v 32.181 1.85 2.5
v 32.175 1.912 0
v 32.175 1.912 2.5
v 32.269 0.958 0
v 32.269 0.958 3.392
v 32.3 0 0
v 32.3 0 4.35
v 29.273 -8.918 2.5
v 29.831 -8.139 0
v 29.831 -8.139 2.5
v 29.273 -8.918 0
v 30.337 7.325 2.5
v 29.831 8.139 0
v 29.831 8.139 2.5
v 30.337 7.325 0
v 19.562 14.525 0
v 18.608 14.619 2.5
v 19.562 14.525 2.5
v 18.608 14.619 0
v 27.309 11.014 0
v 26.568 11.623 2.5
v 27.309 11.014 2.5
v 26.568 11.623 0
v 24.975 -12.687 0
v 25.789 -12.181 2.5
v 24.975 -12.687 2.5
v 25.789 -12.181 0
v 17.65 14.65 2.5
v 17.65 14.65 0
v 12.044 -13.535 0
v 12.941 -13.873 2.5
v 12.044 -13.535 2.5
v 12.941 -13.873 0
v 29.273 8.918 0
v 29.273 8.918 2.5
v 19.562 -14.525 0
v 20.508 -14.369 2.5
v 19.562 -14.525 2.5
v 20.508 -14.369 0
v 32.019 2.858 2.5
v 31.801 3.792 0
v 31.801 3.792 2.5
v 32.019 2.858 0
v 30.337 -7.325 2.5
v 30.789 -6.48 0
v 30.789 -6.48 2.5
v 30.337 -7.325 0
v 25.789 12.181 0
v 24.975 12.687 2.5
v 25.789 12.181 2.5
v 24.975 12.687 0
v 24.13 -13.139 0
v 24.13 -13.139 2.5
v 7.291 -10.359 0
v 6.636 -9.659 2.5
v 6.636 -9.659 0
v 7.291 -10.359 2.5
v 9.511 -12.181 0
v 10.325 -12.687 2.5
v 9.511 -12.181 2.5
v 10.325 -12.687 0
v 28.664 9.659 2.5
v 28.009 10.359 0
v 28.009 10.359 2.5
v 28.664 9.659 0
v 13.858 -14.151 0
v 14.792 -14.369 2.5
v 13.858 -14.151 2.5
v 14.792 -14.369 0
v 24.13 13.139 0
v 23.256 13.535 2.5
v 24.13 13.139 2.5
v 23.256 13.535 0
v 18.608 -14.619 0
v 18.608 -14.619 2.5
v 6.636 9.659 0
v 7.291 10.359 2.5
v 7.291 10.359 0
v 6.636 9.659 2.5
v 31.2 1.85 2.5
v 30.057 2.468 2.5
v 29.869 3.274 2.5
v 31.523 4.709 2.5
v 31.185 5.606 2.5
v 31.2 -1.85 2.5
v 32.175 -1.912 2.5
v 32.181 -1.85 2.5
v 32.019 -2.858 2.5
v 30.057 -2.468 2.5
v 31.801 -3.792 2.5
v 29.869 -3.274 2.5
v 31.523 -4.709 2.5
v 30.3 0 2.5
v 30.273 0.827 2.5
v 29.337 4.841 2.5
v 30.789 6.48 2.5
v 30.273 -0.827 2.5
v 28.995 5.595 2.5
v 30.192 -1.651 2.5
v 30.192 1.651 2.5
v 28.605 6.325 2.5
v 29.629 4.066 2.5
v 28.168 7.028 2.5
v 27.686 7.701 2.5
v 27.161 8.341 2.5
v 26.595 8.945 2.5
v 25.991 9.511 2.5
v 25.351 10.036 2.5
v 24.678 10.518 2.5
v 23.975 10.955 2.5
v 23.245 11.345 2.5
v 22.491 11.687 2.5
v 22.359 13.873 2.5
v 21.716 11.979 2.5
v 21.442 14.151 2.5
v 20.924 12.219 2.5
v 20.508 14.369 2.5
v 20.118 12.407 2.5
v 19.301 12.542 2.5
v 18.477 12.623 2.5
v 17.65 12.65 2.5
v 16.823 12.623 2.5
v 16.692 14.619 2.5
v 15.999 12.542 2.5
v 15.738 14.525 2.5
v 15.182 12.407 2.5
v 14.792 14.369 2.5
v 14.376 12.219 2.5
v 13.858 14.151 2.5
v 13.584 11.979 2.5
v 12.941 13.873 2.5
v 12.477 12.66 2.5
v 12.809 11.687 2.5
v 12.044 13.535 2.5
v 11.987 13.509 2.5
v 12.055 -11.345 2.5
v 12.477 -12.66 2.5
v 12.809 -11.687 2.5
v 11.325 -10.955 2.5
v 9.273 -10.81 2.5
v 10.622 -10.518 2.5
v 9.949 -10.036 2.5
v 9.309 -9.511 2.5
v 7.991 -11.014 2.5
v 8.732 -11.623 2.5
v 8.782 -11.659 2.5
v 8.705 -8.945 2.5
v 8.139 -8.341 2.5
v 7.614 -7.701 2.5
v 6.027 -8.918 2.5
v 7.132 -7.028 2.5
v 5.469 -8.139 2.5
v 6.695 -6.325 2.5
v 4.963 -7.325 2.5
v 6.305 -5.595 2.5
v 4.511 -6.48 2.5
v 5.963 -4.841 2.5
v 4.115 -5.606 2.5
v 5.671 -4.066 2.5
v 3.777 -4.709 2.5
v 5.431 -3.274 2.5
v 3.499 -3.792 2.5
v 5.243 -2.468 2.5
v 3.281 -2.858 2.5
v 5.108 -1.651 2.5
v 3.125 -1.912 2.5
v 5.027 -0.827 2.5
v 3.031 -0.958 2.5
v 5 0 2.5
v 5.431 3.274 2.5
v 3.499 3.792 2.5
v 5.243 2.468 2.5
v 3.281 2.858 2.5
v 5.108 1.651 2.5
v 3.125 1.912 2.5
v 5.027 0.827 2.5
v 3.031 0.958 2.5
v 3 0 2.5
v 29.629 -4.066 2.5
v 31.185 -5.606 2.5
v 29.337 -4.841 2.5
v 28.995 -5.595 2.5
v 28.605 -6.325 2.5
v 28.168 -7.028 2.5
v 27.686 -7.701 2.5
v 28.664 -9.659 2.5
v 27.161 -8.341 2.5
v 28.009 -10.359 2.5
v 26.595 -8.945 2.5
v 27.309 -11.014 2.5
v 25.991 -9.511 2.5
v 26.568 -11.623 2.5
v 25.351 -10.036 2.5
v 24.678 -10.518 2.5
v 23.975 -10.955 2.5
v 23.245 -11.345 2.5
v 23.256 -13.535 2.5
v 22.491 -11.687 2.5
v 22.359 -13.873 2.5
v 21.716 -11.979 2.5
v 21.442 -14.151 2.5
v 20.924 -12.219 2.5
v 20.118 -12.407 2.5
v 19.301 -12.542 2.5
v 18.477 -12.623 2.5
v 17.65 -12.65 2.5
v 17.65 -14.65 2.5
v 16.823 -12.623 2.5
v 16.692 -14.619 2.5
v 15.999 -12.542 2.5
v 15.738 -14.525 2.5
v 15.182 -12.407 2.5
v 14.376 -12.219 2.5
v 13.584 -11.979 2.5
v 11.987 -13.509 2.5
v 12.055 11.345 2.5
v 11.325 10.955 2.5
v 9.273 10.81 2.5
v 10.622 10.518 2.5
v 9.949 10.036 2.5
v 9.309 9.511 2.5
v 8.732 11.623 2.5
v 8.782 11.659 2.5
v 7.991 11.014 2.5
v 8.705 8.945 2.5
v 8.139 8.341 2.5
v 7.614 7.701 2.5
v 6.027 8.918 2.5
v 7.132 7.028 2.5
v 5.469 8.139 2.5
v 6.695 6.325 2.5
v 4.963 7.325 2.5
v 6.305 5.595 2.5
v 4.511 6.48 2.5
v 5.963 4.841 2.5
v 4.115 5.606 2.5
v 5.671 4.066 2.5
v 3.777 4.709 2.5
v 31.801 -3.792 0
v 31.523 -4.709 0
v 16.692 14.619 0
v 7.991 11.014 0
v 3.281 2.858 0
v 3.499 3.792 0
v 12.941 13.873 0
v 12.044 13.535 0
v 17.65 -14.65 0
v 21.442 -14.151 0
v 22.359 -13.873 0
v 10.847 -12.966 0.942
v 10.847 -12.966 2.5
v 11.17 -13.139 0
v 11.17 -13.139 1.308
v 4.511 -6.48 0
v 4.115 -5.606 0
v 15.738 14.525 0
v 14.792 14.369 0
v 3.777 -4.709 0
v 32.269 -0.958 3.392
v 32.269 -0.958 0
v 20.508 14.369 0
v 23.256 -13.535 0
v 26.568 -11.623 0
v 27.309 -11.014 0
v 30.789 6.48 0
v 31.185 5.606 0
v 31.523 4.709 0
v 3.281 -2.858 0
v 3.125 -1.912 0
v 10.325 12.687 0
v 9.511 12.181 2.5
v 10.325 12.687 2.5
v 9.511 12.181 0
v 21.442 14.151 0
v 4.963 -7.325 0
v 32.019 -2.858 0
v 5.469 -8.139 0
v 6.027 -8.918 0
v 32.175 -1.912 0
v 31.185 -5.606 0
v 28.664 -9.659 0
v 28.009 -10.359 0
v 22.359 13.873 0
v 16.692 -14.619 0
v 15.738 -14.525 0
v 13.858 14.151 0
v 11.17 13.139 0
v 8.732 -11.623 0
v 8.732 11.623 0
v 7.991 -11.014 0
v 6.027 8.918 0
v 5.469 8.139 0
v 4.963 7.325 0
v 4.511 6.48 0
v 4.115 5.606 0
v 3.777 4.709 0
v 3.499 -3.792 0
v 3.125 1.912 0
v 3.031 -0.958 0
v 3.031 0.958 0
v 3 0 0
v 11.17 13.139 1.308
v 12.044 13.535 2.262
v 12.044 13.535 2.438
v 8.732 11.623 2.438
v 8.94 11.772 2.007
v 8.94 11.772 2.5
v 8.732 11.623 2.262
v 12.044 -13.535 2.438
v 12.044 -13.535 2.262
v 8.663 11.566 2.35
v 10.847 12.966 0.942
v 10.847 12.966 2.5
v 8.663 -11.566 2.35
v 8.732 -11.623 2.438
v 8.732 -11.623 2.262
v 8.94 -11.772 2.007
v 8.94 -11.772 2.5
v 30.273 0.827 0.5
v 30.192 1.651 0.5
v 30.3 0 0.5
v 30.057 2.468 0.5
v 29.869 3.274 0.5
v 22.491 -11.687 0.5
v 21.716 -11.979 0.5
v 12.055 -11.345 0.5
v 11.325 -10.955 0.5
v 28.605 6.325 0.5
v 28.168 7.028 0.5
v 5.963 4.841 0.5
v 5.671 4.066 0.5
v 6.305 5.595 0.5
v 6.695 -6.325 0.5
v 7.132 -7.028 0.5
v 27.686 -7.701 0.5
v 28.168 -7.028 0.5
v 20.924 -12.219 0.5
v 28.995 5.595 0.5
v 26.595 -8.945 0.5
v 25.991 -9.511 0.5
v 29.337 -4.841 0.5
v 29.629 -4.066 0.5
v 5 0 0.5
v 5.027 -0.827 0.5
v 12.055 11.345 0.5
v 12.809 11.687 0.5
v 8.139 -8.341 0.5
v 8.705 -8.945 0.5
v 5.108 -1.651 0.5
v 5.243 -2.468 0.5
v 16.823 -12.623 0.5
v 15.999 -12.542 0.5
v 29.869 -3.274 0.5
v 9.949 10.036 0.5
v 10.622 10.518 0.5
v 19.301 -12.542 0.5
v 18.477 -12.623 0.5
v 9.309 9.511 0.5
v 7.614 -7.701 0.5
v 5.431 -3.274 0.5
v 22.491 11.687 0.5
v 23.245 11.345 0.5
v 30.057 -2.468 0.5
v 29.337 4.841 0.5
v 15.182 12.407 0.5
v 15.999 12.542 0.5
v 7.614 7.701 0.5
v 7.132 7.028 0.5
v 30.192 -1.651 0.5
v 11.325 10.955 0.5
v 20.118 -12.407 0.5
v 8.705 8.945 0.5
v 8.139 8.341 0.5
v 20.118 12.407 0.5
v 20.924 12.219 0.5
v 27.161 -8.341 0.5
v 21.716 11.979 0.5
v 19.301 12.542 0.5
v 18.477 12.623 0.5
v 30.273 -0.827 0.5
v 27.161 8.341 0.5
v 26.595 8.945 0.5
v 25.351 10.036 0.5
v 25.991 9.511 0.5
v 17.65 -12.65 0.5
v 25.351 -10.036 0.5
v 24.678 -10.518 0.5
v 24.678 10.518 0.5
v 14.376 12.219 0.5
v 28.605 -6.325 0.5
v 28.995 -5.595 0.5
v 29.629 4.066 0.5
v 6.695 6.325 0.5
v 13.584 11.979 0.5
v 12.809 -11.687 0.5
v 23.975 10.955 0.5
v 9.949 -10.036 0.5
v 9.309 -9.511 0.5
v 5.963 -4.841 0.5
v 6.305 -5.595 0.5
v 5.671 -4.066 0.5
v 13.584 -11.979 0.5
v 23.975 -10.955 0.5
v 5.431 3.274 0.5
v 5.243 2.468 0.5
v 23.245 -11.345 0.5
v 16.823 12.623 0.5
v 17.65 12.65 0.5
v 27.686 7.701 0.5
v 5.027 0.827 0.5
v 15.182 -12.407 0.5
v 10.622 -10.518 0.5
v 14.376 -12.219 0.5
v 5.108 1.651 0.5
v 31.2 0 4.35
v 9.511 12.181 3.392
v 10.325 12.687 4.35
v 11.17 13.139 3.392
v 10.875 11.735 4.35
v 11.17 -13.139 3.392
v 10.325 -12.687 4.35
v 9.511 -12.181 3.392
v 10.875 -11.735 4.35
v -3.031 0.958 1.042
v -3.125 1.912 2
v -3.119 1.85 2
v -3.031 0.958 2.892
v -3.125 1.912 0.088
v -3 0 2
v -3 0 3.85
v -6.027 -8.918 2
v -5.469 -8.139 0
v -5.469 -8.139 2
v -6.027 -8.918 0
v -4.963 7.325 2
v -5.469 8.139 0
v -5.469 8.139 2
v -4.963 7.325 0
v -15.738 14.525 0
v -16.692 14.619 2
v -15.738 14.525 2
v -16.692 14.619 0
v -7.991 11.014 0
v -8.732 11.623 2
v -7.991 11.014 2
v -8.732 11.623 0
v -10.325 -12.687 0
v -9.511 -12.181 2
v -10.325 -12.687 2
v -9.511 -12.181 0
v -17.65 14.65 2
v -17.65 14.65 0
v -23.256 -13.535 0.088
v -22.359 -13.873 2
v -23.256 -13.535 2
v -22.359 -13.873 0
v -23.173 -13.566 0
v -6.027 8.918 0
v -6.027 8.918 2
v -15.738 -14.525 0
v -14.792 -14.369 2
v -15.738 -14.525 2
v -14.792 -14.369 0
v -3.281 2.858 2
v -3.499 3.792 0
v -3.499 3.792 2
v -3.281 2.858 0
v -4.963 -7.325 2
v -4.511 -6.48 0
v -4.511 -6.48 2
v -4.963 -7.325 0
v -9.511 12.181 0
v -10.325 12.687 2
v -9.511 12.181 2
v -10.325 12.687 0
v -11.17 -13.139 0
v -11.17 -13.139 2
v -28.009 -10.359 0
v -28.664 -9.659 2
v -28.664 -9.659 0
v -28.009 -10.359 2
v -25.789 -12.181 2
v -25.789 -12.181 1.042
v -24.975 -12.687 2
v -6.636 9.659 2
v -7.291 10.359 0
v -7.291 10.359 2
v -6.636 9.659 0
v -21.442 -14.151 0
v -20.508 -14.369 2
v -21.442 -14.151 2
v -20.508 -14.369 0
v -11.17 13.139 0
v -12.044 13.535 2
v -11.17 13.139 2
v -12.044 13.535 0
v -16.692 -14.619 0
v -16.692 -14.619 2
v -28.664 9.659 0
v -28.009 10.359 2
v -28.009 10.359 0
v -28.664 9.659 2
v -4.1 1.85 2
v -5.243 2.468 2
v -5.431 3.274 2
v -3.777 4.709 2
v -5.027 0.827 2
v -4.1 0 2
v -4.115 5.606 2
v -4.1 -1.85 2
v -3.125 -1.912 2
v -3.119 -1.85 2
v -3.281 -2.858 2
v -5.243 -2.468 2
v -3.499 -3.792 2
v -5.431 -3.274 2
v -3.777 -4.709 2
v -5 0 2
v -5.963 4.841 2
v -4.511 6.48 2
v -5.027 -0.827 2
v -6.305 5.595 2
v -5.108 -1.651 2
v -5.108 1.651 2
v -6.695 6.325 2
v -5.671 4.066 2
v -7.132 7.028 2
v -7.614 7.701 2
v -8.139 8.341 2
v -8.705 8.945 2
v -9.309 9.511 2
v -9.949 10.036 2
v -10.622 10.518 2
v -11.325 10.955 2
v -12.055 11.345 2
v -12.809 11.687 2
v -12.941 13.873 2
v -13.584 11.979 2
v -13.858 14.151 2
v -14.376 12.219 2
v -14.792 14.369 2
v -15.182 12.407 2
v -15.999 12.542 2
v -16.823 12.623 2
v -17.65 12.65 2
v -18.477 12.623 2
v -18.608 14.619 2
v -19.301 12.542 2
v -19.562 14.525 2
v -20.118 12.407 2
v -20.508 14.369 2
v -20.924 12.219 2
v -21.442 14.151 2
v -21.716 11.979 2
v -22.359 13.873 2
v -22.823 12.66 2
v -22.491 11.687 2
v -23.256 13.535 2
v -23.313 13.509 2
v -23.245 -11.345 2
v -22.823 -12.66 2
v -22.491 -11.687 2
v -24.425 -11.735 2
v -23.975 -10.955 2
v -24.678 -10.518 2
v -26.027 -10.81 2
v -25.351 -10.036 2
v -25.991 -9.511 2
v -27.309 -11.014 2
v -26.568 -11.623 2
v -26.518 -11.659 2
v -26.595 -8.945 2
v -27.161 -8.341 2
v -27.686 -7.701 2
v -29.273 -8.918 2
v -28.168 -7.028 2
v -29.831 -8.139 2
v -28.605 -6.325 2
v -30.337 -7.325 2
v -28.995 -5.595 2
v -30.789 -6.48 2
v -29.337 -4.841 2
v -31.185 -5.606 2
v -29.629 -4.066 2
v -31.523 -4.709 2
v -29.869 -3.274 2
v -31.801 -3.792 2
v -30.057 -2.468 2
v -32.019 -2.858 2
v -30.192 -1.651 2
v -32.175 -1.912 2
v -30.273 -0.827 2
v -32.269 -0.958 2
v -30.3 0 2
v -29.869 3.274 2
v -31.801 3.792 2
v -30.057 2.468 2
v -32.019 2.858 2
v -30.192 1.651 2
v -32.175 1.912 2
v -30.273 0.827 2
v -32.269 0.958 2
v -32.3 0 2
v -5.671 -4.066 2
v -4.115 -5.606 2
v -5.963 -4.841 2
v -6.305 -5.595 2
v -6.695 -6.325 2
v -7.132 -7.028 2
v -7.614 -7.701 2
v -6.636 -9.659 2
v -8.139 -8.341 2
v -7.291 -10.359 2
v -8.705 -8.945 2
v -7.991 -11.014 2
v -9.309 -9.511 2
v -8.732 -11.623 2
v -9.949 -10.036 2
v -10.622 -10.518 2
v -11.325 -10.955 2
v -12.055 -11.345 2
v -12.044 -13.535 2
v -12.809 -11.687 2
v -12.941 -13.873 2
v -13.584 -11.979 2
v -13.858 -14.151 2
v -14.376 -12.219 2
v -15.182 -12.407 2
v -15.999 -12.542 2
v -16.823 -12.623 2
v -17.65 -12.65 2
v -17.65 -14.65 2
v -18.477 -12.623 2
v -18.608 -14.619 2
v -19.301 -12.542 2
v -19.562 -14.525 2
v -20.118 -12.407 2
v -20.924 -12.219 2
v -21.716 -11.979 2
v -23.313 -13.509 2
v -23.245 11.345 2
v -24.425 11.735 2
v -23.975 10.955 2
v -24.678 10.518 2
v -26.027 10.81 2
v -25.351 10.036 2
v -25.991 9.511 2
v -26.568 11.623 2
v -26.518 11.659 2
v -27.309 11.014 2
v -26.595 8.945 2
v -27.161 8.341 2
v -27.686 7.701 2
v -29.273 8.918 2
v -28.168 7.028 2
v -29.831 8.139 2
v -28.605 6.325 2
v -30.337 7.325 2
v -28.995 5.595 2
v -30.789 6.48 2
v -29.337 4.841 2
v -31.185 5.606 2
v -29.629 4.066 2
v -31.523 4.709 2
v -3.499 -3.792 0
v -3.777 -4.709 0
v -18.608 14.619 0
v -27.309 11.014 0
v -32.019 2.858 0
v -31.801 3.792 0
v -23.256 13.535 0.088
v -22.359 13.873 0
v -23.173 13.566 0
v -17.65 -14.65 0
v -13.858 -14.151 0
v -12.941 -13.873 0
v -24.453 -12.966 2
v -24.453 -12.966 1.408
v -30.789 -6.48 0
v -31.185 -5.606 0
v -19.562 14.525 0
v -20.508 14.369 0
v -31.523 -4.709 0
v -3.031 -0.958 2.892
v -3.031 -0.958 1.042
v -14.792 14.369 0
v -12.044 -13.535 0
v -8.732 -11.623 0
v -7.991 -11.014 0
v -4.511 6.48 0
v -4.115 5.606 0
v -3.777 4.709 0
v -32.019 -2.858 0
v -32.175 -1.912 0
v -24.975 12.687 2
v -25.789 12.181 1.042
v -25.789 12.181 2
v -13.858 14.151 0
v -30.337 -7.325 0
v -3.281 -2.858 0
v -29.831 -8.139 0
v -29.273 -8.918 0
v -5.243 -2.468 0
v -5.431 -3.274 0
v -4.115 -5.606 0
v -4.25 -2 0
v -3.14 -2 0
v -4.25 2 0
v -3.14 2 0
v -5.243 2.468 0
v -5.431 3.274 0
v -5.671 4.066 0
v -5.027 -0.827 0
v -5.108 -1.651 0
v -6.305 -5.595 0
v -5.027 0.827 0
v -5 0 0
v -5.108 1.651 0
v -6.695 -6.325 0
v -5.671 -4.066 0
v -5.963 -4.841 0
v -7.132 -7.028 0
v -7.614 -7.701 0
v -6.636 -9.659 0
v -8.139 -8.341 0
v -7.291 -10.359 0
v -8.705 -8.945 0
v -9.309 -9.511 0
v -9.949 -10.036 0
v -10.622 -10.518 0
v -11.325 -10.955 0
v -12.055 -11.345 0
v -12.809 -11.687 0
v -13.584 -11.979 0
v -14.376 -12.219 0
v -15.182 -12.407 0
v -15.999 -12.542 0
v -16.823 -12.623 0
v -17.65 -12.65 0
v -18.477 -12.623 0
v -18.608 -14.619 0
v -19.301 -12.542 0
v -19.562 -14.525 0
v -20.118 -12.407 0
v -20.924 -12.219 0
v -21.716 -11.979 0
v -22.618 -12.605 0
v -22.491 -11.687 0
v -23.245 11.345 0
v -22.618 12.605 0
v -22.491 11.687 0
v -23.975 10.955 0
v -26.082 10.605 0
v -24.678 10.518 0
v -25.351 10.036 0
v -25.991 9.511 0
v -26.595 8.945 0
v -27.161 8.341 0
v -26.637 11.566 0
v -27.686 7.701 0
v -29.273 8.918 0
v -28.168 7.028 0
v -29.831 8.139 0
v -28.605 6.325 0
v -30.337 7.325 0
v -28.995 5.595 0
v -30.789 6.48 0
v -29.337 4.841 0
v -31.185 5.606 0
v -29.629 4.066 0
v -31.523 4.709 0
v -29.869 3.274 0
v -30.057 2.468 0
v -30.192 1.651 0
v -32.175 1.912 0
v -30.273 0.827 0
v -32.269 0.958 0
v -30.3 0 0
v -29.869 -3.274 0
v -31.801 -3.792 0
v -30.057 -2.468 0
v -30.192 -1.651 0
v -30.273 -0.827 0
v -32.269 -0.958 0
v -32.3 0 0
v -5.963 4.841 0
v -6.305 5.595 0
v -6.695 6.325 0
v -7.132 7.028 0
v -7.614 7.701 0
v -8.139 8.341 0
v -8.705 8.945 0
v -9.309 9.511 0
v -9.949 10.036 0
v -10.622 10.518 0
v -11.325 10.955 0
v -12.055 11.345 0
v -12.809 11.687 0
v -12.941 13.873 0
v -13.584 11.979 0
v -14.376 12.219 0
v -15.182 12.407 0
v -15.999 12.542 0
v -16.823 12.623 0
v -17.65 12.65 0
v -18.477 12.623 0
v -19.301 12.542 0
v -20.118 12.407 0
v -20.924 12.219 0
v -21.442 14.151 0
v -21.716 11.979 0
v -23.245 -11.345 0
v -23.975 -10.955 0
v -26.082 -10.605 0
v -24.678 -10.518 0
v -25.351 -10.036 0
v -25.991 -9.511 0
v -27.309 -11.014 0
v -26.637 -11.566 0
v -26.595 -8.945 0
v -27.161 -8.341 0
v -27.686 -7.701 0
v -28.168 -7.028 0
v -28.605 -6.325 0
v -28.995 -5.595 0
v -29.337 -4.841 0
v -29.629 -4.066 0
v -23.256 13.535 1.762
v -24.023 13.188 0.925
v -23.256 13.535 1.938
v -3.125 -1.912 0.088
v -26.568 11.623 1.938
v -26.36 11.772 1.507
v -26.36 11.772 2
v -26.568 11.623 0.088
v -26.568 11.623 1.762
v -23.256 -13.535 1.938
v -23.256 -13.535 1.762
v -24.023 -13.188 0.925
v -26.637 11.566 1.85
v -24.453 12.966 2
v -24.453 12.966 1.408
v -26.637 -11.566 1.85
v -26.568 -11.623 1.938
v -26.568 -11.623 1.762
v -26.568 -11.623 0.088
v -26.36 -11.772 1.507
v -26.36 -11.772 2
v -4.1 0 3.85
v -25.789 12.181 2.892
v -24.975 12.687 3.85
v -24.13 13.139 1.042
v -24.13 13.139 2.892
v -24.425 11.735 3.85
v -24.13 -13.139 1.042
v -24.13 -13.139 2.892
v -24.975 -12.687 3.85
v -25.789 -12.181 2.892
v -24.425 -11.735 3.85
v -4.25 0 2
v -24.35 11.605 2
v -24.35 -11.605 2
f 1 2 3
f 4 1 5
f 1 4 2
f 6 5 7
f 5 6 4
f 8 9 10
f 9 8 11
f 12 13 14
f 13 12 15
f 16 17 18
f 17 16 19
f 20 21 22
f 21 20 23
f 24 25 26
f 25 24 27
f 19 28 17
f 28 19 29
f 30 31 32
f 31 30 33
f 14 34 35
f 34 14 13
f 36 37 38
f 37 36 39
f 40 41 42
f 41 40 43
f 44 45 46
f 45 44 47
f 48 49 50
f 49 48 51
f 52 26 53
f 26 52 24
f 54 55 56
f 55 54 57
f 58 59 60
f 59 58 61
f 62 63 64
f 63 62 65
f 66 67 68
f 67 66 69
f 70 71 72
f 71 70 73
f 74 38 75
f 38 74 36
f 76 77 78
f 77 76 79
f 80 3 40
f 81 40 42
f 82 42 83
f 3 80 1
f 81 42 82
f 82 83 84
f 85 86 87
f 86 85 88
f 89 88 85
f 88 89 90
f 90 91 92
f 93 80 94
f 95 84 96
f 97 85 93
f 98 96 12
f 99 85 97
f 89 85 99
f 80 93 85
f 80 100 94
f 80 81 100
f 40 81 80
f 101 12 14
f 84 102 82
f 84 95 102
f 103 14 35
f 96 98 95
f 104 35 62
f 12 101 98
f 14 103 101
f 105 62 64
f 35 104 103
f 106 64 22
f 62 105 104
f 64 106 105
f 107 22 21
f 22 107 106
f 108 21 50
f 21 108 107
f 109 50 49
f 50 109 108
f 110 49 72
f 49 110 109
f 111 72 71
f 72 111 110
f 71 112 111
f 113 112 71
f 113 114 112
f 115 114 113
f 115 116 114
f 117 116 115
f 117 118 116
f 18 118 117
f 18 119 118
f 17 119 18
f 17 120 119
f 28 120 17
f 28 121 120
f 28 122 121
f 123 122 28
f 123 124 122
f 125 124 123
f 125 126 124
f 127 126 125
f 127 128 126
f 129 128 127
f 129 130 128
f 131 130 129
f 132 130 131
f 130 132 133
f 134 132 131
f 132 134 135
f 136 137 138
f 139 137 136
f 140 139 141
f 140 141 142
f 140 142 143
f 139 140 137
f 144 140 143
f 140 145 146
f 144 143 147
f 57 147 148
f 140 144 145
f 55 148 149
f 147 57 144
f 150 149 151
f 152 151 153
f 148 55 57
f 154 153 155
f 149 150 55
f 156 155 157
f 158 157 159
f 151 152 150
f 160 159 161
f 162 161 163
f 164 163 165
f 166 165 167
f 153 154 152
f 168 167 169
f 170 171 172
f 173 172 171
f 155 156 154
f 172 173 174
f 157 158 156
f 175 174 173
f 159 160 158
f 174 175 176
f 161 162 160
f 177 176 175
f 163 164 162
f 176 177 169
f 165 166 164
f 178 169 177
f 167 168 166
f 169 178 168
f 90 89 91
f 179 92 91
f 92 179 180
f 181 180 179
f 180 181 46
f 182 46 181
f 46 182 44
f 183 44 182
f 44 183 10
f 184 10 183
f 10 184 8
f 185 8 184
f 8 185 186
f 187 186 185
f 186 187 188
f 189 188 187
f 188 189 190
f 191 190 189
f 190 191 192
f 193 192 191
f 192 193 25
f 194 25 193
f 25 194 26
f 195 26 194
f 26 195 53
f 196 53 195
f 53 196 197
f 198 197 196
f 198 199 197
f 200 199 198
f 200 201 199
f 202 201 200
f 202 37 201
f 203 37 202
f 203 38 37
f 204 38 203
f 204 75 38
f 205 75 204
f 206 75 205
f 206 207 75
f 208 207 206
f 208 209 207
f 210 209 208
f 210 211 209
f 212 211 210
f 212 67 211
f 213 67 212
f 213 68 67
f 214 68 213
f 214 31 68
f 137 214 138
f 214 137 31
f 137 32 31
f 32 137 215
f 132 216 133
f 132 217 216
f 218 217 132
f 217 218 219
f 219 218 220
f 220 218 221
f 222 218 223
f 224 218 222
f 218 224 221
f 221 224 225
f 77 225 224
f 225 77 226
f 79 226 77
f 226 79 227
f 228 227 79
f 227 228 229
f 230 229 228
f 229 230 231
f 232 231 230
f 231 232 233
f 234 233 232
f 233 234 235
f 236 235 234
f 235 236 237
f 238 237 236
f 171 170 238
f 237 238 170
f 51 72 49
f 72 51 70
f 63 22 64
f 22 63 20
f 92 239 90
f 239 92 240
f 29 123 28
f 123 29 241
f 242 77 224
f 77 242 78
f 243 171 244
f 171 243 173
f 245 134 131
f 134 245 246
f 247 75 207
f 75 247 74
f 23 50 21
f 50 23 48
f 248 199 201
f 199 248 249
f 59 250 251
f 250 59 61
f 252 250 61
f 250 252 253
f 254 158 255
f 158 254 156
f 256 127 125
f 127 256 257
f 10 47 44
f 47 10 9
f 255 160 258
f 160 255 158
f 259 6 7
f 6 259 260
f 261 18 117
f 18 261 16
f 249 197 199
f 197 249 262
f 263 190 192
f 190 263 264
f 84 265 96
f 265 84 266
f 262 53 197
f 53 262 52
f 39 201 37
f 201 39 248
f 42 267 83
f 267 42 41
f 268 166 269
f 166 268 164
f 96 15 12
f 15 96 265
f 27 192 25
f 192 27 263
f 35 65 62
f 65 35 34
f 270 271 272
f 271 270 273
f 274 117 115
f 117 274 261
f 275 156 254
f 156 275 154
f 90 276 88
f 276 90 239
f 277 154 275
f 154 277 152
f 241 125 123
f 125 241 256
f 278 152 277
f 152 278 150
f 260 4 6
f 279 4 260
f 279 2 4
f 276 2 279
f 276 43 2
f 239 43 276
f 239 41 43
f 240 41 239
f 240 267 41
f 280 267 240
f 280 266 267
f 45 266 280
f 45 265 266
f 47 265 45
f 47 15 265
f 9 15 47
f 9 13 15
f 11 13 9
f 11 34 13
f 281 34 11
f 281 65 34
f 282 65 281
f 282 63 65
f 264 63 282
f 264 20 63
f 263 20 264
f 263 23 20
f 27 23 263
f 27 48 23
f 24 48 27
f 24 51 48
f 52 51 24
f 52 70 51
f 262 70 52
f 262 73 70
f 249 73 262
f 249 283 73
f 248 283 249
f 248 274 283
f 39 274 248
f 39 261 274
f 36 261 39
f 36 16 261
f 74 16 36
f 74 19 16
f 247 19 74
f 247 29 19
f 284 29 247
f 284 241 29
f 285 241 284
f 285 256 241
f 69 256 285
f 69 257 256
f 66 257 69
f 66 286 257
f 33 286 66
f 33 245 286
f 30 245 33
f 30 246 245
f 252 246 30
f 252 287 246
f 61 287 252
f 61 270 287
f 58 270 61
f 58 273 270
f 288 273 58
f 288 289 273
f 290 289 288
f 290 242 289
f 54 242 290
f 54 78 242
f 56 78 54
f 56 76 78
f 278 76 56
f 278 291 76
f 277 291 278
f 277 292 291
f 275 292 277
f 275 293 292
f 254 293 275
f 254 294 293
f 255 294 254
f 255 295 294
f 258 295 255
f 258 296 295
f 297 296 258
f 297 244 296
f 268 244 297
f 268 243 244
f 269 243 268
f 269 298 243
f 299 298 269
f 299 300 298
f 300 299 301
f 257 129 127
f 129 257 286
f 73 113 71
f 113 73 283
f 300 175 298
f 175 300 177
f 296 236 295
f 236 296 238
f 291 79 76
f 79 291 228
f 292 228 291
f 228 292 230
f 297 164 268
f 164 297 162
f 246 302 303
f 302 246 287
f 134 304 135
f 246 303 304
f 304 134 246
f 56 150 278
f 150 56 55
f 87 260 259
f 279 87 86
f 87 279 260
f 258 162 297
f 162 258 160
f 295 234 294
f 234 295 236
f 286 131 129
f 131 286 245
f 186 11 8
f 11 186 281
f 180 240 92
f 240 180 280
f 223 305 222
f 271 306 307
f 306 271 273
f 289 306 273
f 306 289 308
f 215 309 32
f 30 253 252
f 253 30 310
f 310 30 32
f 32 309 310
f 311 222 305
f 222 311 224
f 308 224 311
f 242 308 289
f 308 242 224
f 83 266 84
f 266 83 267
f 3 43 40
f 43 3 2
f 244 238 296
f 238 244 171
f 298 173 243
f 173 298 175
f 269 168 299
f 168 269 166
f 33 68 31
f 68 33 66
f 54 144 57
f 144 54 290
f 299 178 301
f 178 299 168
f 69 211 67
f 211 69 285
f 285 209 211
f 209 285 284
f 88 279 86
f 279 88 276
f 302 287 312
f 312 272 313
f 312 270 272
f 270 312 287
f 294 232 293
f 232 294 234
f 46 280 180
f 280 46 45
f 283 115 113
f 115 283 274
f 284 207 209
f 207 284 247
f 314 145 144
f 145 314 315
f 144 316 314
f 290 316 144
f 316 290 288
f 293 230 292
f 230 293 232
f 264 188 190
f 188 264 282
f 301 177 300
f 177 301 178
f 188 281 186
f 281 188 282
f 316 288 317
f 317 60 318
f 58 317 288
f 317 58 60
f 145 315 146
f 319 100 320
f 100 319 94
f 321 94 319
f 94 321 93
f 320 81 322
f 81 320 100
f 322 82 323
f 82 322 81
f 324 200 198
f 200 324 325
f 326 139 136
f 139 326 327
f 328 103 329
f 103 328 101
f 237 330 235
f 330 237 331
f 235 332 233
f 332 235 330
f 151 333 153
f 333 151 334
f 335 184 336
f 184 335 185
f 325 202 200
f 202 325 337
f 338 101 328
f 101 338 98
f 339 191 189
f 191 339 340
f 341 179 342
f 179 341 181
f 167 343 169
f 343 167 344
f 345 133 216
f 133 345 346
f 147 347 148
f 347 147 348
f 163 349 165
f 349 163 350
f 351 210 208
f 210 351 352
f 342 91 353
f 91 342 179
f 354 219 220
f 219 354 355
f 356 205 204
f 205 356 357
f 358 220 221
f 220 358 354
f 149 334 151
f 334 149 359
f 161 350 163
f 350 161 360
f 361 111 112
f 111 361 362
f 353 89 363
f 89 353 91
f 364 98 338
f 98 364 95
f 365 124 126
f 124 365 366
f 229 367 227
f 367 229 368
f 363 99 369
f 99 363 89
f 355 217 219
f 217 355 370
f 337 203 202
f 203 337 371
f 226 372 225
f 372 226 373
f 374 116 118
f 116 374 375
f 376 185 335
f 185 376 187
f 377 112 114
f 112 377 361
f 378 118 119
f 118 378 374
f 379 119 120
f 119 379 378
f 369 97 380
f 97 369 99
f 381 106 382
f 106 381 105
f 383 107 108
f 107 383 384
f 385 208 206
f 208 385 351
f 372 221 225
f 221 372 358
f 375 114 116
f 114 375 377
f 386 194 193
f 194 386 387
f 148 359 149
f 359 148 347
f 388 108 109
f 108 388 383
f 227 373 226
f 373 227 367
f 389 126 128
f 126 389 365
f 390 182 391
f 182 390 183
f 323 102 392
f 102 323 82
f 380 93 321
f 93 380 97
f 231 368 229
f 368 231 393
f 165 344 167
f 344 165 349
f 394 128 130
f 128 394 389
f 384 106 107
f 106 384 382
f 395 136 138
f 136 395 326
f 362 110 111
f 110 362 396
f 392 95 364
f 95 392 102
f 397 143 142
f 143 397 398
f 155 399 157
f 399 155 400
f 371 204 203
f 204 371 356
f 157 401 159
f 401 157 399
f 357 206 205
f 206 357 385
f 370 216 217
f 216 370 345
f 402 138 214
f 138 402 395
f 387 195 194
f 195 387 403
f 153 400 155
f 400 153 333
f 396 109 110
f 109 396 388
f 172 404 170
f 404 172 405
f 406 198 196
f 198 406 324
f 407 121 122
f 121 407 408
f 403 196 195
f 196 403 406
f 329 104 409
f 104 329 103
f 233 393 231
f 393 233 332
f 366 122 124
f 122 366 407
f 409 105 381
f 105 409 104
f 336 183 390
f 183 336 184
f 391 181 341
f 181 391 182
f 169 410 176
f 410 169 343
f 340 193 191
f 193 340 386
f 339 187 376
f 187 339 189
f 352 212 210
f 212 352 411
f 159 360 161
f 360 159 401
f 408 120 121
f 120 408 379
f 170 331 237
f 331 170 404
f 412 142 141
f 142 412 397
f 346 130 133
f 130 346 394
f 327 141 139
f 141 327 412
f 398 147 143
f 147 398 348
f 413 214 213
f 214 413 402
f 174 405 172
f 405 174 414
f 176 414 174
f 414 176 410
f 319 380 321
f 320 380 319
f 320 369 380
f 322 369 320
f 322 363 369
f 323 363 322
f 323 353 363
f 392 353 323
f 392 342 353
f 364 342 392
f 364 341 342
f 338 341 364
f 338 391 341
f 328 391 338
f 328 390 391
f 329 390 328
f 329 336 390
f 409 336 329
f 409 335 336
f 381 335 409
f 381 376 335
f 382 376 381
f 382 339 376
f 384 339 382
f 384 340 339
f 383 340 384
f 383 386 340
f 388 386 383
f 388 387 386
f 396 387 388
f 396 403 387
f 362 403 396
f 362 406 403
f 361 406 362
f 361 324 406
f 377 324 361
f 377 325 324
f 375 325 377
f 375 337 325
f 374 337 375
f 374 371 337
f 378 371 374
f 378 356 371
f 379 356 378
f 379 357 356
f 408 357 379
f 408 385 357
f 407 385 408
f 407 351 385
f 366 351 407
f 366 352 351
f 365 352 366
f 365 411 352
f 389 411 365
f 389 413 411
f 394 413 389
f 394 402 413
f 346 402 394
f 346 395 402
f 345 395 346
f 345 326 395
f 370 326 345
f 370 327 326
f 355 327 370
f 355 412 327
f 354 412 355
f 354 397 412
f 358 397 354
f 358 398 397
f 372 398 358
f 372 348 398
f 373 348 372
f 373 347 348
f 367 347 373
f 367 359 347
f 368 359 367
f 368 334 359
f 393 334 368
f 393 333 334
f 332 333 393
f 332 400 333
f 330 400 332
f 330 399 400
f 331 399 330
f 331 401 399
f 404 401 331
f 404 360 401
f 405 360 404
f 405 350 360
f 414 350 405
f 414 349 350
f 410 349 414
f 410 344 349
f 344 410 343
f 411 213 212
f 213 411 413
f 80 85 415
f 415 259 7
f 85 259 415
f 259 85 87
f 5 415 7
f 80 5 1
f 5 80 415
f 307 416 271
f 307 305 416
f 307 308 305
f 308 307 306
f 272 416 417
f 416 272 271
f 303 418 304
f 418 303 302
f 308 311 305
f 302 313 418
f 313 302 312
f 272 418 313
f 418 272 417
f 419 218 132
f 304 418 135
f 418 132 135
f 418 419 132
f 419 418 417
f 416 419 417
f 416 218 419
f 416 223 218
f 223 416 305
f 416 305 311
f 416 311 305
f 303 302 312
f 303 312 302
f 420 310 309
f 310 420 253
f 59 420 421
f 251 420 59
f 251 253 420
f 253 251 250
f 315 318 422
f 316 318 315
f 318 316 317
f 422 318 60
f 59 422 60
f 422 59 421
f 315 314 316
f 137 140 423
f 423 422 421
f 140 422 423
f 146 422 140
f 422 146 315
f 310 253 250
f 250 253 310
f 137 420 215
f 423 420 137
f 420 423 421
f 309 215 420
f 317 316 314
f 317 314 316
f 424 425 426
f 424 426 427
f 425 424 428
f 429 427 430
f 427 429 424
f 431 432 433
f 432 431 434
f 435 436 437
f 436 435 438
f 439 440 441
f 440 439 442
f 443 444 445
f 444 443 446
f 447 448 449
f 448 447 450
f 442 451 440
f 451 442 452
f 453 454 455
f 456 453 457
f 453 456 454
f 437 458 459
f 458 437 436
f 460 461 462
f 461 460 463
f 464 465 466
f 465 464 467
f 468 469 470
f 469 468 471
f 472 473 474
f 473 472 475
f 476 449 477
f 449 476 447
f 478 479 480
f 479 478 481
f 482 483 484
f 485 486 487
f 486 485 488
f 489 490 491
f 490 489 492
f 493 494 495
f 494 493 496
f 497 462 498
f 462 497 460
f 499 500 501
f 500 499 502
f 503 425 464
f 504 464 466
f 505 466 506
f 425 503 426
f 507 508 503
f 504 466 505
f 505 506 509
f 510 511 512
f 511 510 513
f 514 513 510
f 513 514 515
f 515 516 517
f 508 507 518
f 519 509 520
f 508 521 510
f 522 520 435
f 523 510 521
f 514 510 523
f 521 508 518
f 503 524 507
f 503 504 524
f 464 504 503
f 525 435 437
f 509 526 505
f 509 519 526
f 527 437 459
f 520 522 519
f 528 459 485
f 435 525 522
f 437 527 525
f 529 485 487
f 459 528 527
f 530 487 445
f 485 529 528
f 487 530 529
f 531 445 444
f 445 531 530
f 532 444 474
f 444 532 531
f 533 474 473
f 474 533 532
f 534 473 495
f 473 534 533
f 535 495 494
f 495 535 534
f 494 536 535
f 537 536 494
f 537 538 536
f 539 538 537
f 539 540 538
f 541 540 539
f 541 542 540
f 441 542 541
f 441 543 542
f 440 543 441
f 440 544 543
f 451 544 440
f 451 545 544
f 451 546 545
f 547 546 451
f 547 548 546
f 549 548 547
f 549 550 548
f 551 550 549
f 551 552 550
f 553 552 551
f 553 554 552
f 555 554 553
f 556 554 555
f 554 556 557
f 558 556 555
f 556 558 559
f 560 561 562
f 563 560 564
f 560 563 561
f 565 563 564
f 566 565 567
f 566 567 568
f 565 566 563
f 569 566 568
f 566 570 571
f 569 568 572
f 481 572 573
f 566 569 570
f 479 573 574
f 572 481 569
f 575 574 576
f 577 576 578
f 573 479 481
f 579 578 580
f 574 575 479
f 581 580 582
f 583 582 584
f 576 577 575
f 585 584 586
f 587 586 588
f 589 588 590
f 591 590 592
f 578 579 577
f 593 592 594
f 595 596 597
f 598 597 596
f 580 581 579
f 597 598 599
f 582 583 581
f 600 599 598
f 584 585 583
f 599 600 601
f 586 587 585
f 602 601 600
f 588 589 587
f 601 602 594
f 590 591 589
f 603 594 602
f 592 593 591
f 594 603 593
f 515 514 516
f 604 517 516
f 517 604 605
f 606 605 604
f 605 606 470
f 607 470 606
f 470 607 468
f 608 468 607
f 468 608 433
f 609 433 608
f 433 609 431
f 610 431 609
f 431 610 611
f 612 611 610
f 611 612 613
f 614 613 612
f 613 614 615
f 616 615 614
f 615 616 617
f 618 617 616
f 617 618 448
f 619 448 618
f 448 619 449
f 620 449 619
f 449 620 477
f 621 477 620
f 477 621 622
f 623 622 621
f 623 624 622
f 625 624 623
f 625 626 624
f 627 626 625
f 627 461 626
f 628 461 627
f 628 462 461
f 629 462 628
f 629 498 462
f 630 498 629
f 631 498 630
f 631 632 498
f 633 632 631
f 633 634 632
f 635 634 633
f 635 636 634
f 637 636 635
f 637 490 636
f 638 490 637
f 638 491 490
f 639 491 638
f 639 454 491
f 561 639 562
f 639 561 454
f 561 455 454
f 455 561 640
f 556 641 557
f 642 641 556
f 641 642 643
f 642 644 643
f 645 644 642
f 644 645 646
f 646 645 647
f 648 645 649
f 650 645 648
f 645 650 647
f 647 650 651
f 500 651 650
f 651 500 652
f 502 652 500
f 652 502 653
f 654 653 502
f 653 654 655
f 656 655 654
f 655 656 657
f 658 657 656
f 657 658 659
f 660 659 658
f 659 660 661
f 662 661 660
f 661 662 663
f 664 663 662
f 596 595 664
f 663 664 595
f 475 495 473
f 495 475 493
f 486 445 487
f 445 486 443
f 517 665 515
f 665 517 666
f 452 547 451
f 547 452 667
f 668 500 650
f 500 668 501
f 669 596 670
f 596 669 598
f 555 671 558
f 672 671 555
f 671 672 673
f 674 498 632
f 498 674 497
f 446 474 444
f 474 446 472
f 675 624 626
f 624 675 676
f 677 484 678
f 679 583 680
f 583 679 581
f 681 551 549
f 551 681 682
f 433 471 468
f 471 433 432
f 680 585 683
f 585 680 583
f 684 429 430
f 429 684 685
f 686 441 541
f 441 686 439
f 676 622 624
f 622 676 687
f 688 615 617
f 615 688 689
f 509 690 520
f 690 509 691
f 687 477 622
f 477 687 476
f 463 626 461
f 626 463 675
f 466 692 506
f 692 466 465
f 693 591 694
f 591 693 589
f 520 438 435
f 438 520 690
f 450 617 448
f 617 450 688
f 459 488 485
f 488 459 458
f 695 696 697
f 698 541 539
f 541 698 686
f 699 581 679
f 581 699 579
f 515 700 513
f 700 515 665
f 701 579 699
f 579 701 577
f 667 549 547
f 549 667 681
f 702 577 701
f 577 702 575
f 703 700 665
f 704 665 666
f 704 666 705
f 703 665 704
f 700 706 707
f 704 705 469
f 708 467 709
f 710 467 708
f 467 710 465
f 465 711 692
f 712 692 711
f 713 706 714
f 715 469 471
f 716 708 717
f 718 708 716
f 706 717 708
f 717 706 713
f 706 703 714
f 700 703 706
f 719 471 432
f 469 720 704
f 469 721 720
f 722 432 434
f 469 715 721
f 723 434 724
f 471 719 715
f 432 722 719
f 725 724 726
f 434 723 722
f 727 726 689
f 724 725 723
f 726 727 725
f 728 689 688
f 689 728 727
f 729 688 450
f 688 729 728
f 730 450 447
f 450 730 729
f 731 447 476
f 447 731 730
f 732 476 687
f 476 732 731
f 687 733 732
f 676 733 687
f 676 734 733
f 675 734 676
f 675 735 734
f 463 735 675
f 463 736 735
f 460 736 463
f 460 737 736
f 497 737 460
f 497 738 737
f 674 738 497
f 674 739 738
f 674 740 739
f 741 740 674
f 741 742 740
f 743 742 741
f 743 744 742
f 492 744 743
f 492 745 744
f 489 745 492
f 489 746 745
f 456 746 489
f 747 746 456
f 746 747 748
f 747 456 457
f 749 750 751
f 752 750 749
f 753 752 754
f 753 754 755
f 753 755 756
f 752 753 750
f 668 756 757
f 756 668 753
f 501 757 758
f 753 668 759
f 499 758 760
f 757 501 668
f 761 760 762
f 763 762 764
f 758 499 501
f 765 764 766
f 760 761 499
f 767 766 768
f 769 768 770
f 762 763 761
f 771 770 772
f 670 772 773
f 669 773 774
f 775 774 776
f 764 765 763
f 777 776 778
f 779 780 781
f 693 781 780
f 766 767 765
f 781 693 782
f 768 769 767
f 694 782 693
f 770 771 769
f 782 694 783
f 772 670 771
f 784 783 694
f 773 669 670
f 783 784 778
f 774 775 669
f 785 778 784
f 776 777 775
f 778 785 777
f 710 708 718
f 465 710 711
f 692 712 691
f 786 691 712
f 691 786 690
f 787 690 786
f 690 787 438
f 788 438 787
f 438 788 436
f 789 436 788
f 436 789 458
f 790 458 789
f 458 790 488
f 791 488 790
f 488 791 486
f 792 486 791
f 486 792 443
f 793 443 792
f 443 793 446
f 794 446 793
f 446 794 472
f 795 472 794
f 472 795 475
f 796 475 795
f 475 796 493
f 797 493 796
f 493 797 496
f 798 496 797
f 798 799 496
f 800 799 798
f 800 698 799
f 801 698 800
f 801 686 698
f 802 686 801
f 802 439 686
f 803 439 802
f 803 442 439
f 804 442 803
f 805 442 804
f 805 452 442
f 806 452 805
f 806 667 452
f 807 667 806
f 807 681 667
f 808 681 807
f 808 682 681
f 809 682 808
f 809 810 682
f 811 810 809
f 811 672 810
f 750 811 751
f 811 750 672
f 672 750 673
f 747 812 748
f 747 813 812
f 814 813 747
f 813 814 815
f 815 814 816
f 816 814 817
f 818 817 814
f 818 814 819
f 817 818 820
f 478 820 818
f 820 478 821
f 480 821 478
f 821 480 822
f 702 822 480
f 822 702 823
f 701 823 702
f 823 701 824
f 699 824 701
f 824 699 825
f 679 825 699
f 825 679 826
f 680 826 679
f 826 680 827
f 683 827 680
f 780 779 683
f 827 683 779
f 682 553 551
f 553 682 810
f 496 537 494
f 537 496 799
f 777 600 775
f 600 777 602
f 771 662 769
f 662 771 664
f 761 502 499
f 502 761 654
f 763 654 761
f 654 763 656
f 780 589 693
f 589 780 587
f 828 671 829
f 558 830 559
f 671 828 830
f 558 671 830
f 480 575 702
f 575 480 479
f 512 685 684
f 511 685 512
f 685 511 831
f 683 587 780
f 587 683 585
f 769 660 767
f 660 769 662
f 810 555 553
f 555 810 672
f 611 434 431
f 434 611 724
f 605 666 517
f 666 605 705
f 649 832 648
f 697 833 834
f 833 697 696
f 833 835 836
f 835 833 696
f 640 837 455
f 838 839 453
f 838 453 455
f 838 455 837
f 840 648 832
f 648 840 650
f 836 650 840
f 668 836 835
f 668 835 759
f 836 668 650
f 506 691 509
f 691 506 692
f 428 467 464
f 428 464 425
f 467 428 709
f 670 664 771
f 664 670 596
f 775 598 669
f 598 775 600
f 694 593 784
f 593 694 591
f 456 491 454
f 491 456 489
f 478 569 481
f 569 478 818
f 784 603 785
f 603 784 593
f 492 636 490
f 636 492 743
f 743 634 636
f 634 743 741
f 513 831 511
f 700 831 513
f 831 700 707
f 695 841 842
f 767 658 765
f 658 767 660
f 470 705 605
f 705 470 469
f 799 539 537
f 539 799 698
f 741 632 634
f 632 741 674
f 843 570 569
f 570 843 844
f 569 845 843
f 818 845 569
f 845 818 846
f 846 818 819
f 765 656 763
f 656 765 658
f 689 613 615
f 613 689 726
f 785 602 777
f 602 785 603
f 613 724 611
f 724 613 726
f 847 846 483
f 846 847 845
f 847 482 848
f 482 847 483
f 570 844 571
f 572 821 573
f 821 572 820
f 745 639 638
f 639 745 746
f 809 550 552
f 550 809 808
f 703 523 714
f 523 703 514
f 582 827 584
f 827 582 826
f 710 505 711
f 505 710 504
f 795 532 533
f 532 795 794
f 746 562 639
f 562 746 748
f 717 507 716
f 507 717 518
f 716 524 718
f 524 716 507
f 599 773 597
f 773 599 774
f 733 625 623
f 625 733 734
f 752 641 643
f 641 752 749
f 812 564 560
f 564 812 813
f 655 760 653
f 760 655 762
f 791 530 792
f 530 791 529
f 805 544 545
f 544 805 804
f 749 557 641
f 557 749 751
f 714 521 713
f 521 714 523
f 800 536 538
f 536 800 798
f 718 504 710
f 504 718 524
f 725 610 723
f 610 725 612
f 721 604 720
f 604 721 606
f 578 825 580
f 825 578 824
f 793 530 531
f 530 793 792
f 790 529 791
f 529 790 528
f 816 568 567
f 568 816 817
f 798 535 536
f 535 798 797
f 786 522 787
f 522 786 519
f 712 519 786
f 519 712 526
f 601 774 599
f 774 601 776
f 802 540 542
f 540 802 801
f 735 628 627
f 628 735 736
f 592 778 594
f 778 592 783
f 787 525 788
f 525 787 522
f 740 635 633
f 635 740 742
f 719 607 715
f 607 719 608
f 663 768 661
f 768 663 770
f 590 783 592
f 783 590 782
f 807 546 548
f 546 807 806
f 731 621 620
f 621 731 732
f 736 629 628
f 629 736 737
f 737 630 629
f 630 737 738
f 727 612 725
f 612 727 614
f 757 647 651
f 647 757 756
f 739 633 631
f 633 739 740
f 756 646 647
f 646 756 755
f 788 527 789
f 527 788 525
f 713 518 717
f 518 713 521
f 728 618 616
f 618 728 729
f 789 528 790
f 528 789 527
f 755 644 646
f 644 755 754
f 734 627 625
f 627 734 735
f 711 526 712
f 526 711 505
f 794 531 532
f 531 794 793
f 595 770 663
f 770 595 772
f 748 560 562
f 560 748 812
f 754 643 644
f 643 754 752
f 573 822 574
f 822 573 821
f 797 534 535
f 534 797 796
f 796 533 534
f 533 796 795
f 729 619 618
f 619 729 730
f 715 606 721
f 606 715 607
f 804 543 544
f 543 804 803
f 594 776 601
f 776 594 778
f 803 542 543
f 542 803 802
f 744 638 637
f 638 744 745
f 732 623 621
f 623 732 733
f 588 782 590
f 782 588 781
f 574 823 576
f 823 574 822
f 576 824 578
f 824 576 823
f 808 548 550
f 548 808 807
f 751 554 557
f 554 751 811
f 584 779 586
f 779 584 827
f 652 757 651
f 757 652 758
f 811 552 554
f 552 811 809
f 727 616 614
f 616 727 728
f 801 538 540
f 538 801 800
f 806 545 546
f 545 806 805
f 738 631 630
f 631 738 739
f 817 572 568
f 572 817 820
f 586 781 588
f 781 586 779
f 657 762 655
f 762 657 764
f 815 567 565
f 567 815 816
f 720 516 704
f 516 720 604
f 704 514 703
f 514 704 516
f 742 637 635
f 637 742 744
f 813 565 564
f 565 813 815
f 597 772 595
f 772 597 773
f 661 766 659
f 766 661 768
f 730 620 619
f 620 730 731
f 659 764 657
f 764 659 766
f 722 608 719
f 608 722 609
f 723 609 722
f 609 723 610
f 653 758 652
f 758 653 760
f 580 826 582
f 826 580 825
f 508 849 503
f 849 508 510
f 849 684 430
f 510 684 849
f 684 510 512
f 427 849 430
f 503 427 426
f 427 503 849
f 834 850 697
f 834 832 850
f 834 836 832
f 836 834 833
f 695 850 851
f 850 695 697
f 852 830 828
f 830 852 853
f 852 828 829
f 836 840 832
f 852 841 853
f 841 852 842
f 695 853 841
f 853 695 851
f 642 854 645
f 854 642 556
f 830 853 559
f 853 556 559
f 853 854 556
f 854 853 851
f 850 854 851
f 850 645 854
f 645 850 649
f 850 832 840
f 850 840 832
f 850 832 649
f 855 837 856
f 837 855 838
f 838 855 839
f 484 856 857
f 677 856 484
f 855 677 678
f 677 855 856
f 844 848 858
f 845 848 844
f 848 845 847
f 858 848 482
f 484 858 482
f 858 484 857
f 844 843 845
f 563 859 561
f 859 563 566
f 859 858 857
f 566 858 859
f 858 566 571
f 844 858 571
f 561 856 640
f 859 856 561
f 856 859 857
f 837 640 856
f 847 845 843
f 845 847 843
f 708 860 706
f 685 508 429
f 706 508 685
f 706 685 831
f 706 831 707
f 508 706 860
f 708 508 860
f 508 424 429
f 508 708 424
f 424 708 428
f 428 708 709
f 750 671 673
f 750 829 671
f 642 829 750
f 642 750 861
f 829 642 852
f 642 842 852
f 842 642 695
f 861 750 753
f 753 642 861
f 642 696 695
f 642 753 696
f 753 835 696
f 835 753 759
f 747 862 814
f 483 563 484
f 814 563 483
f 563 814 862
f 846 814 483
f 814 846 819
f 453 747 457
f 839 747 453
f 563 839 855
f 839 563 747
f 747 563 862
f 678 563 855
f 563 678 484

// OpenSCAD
/*
* SKILL-RING copyright Thibaut Pral - november 2015
*/

// preview[view:south east, tilt:top diagonal]

//what will be rendered
what_to_show = 3; // [0:Stacked base and rings,1:Base only,2:Ring only,3:Base and ring]

//diameter of your figurine base
base_diameter = 25;

//(expluding spikes's height)
base_height = 2.5;

//thickness of the bottom part of the base
base_flat_thickness = 0.5;

ring_width = 2;
ring_height = 2;

number_of_spikes = 3; // [2,3,4,5,6,8,9,10,12]

//recommended clearance is about half your nozzle diameter
clearance = 0.15;
spikes_radial_offset = 0.1;
polygons_precision = 96; // [24,48,72,96,192]


/* [Hidden] */
baseDiam = base_diameter + clearance*2;
diamondsSize = 2*ring_height/sqrt(2);
partAngle = 360/number_of_spikes;
endAngle = 360-partAngle;
ringbase_heightDiff = base_height - ring_height;

//base build
module base() {
    baseBaseCylinder();
    for (a =[0:partAngle:endAngle])
        baseSpikeOut(a);
}
module baseBaseCylinder() {
    difference() {
        cylinder(d=baseDiam+ring_width*2,h=base_height,$fn=polygons_precision);
        translate([0,0,base_flat_thickness])
            cylinder(d=baseDiam,h=base_height,$fn=polygons_precision);
    }
}
module baseSpikeOut(angle) {
    rotate([0,0,angle])
        difference() {
            translate([(baseDiam+ring_width)/2-spikes_radial_offset,0,-1*clearance+ringbase_heightDiff])
                rotate([45,0,0])
                    cube([diamondsSize,diamondsSize,diamondsSize],center=false);
            union() {
                translate([0,0,-10]) externalCylinder();
                translate([0,0,-50]) cube([100,100,100],center=true);
            }
        }
        
}

//ring build
module ring() {
    difference() {
        union() {
            ringBaseTube();
            for (a =[0:partAngle:endAngle])
                ringSpikeOut(a);
        }
        union() {
            for (a =[0:partAngle:endAngle])
                ringSpikeIn(a);
        }
    }
}
module externalCylinder() {
    difference() {
        cylinder(d=baseDiam+40,h=base_height+40,$fn=polygons_precision);
        translate([0,0,-5])
            cylinder(d=baseDiam+ring_width*2,h=base_height+42,$fn=polygons_precision);
    }
}
module ringBaseTube() {
    difference() {
        cylinder(d=baseDiam+ring_width*2,h=ring_height,$fn=polygons_precision);
        translate([0,0,-1])
            cylinder(d=baseDiam,h=ring_height+2,$fn=polygons_precision);
    }
}
module ringSpikeIn(angle) {
    rotate([0,0,angle])
        translate([(baseDiam+ring_width)/2-spikes_radial_offset-clearance,0,-1*ring_height])
            rotate([45,0,0])
                cube([diamondsSize+100,diamondsSize,diamondsSize],center=false);
}
module ringSpikeOut(angle) {
    rotate([0,0,angle])
        difference() {
            translate([(baseDiam+ring_width)/2-spikes_radial_offset,0,-1*clearance])
                rotate([45,0,0])
                    cube([diamondsSize,diamondsSize,diamondsSize],center=false);
            externalCylinder();
        }
}






if(what_to_show==0) {
        base();
        translate([0,0,base_height+clearance/2])
            ring();
        translate([0,0,base_height+ring_height+clearance])
            ring();
        translate([0,0,base_height+ring_height*2+clearance*1.5])
            ring();
} else if(what_to_show==1) {
    base();
} else if(what_to_show==2) {
    ring();
} else if(what_to_show==3) {
    translate([(baseDiam+10)/2,0,0])
        base();
    translate([(baseDiam+10)/-2,0,0])
        ring();
}
